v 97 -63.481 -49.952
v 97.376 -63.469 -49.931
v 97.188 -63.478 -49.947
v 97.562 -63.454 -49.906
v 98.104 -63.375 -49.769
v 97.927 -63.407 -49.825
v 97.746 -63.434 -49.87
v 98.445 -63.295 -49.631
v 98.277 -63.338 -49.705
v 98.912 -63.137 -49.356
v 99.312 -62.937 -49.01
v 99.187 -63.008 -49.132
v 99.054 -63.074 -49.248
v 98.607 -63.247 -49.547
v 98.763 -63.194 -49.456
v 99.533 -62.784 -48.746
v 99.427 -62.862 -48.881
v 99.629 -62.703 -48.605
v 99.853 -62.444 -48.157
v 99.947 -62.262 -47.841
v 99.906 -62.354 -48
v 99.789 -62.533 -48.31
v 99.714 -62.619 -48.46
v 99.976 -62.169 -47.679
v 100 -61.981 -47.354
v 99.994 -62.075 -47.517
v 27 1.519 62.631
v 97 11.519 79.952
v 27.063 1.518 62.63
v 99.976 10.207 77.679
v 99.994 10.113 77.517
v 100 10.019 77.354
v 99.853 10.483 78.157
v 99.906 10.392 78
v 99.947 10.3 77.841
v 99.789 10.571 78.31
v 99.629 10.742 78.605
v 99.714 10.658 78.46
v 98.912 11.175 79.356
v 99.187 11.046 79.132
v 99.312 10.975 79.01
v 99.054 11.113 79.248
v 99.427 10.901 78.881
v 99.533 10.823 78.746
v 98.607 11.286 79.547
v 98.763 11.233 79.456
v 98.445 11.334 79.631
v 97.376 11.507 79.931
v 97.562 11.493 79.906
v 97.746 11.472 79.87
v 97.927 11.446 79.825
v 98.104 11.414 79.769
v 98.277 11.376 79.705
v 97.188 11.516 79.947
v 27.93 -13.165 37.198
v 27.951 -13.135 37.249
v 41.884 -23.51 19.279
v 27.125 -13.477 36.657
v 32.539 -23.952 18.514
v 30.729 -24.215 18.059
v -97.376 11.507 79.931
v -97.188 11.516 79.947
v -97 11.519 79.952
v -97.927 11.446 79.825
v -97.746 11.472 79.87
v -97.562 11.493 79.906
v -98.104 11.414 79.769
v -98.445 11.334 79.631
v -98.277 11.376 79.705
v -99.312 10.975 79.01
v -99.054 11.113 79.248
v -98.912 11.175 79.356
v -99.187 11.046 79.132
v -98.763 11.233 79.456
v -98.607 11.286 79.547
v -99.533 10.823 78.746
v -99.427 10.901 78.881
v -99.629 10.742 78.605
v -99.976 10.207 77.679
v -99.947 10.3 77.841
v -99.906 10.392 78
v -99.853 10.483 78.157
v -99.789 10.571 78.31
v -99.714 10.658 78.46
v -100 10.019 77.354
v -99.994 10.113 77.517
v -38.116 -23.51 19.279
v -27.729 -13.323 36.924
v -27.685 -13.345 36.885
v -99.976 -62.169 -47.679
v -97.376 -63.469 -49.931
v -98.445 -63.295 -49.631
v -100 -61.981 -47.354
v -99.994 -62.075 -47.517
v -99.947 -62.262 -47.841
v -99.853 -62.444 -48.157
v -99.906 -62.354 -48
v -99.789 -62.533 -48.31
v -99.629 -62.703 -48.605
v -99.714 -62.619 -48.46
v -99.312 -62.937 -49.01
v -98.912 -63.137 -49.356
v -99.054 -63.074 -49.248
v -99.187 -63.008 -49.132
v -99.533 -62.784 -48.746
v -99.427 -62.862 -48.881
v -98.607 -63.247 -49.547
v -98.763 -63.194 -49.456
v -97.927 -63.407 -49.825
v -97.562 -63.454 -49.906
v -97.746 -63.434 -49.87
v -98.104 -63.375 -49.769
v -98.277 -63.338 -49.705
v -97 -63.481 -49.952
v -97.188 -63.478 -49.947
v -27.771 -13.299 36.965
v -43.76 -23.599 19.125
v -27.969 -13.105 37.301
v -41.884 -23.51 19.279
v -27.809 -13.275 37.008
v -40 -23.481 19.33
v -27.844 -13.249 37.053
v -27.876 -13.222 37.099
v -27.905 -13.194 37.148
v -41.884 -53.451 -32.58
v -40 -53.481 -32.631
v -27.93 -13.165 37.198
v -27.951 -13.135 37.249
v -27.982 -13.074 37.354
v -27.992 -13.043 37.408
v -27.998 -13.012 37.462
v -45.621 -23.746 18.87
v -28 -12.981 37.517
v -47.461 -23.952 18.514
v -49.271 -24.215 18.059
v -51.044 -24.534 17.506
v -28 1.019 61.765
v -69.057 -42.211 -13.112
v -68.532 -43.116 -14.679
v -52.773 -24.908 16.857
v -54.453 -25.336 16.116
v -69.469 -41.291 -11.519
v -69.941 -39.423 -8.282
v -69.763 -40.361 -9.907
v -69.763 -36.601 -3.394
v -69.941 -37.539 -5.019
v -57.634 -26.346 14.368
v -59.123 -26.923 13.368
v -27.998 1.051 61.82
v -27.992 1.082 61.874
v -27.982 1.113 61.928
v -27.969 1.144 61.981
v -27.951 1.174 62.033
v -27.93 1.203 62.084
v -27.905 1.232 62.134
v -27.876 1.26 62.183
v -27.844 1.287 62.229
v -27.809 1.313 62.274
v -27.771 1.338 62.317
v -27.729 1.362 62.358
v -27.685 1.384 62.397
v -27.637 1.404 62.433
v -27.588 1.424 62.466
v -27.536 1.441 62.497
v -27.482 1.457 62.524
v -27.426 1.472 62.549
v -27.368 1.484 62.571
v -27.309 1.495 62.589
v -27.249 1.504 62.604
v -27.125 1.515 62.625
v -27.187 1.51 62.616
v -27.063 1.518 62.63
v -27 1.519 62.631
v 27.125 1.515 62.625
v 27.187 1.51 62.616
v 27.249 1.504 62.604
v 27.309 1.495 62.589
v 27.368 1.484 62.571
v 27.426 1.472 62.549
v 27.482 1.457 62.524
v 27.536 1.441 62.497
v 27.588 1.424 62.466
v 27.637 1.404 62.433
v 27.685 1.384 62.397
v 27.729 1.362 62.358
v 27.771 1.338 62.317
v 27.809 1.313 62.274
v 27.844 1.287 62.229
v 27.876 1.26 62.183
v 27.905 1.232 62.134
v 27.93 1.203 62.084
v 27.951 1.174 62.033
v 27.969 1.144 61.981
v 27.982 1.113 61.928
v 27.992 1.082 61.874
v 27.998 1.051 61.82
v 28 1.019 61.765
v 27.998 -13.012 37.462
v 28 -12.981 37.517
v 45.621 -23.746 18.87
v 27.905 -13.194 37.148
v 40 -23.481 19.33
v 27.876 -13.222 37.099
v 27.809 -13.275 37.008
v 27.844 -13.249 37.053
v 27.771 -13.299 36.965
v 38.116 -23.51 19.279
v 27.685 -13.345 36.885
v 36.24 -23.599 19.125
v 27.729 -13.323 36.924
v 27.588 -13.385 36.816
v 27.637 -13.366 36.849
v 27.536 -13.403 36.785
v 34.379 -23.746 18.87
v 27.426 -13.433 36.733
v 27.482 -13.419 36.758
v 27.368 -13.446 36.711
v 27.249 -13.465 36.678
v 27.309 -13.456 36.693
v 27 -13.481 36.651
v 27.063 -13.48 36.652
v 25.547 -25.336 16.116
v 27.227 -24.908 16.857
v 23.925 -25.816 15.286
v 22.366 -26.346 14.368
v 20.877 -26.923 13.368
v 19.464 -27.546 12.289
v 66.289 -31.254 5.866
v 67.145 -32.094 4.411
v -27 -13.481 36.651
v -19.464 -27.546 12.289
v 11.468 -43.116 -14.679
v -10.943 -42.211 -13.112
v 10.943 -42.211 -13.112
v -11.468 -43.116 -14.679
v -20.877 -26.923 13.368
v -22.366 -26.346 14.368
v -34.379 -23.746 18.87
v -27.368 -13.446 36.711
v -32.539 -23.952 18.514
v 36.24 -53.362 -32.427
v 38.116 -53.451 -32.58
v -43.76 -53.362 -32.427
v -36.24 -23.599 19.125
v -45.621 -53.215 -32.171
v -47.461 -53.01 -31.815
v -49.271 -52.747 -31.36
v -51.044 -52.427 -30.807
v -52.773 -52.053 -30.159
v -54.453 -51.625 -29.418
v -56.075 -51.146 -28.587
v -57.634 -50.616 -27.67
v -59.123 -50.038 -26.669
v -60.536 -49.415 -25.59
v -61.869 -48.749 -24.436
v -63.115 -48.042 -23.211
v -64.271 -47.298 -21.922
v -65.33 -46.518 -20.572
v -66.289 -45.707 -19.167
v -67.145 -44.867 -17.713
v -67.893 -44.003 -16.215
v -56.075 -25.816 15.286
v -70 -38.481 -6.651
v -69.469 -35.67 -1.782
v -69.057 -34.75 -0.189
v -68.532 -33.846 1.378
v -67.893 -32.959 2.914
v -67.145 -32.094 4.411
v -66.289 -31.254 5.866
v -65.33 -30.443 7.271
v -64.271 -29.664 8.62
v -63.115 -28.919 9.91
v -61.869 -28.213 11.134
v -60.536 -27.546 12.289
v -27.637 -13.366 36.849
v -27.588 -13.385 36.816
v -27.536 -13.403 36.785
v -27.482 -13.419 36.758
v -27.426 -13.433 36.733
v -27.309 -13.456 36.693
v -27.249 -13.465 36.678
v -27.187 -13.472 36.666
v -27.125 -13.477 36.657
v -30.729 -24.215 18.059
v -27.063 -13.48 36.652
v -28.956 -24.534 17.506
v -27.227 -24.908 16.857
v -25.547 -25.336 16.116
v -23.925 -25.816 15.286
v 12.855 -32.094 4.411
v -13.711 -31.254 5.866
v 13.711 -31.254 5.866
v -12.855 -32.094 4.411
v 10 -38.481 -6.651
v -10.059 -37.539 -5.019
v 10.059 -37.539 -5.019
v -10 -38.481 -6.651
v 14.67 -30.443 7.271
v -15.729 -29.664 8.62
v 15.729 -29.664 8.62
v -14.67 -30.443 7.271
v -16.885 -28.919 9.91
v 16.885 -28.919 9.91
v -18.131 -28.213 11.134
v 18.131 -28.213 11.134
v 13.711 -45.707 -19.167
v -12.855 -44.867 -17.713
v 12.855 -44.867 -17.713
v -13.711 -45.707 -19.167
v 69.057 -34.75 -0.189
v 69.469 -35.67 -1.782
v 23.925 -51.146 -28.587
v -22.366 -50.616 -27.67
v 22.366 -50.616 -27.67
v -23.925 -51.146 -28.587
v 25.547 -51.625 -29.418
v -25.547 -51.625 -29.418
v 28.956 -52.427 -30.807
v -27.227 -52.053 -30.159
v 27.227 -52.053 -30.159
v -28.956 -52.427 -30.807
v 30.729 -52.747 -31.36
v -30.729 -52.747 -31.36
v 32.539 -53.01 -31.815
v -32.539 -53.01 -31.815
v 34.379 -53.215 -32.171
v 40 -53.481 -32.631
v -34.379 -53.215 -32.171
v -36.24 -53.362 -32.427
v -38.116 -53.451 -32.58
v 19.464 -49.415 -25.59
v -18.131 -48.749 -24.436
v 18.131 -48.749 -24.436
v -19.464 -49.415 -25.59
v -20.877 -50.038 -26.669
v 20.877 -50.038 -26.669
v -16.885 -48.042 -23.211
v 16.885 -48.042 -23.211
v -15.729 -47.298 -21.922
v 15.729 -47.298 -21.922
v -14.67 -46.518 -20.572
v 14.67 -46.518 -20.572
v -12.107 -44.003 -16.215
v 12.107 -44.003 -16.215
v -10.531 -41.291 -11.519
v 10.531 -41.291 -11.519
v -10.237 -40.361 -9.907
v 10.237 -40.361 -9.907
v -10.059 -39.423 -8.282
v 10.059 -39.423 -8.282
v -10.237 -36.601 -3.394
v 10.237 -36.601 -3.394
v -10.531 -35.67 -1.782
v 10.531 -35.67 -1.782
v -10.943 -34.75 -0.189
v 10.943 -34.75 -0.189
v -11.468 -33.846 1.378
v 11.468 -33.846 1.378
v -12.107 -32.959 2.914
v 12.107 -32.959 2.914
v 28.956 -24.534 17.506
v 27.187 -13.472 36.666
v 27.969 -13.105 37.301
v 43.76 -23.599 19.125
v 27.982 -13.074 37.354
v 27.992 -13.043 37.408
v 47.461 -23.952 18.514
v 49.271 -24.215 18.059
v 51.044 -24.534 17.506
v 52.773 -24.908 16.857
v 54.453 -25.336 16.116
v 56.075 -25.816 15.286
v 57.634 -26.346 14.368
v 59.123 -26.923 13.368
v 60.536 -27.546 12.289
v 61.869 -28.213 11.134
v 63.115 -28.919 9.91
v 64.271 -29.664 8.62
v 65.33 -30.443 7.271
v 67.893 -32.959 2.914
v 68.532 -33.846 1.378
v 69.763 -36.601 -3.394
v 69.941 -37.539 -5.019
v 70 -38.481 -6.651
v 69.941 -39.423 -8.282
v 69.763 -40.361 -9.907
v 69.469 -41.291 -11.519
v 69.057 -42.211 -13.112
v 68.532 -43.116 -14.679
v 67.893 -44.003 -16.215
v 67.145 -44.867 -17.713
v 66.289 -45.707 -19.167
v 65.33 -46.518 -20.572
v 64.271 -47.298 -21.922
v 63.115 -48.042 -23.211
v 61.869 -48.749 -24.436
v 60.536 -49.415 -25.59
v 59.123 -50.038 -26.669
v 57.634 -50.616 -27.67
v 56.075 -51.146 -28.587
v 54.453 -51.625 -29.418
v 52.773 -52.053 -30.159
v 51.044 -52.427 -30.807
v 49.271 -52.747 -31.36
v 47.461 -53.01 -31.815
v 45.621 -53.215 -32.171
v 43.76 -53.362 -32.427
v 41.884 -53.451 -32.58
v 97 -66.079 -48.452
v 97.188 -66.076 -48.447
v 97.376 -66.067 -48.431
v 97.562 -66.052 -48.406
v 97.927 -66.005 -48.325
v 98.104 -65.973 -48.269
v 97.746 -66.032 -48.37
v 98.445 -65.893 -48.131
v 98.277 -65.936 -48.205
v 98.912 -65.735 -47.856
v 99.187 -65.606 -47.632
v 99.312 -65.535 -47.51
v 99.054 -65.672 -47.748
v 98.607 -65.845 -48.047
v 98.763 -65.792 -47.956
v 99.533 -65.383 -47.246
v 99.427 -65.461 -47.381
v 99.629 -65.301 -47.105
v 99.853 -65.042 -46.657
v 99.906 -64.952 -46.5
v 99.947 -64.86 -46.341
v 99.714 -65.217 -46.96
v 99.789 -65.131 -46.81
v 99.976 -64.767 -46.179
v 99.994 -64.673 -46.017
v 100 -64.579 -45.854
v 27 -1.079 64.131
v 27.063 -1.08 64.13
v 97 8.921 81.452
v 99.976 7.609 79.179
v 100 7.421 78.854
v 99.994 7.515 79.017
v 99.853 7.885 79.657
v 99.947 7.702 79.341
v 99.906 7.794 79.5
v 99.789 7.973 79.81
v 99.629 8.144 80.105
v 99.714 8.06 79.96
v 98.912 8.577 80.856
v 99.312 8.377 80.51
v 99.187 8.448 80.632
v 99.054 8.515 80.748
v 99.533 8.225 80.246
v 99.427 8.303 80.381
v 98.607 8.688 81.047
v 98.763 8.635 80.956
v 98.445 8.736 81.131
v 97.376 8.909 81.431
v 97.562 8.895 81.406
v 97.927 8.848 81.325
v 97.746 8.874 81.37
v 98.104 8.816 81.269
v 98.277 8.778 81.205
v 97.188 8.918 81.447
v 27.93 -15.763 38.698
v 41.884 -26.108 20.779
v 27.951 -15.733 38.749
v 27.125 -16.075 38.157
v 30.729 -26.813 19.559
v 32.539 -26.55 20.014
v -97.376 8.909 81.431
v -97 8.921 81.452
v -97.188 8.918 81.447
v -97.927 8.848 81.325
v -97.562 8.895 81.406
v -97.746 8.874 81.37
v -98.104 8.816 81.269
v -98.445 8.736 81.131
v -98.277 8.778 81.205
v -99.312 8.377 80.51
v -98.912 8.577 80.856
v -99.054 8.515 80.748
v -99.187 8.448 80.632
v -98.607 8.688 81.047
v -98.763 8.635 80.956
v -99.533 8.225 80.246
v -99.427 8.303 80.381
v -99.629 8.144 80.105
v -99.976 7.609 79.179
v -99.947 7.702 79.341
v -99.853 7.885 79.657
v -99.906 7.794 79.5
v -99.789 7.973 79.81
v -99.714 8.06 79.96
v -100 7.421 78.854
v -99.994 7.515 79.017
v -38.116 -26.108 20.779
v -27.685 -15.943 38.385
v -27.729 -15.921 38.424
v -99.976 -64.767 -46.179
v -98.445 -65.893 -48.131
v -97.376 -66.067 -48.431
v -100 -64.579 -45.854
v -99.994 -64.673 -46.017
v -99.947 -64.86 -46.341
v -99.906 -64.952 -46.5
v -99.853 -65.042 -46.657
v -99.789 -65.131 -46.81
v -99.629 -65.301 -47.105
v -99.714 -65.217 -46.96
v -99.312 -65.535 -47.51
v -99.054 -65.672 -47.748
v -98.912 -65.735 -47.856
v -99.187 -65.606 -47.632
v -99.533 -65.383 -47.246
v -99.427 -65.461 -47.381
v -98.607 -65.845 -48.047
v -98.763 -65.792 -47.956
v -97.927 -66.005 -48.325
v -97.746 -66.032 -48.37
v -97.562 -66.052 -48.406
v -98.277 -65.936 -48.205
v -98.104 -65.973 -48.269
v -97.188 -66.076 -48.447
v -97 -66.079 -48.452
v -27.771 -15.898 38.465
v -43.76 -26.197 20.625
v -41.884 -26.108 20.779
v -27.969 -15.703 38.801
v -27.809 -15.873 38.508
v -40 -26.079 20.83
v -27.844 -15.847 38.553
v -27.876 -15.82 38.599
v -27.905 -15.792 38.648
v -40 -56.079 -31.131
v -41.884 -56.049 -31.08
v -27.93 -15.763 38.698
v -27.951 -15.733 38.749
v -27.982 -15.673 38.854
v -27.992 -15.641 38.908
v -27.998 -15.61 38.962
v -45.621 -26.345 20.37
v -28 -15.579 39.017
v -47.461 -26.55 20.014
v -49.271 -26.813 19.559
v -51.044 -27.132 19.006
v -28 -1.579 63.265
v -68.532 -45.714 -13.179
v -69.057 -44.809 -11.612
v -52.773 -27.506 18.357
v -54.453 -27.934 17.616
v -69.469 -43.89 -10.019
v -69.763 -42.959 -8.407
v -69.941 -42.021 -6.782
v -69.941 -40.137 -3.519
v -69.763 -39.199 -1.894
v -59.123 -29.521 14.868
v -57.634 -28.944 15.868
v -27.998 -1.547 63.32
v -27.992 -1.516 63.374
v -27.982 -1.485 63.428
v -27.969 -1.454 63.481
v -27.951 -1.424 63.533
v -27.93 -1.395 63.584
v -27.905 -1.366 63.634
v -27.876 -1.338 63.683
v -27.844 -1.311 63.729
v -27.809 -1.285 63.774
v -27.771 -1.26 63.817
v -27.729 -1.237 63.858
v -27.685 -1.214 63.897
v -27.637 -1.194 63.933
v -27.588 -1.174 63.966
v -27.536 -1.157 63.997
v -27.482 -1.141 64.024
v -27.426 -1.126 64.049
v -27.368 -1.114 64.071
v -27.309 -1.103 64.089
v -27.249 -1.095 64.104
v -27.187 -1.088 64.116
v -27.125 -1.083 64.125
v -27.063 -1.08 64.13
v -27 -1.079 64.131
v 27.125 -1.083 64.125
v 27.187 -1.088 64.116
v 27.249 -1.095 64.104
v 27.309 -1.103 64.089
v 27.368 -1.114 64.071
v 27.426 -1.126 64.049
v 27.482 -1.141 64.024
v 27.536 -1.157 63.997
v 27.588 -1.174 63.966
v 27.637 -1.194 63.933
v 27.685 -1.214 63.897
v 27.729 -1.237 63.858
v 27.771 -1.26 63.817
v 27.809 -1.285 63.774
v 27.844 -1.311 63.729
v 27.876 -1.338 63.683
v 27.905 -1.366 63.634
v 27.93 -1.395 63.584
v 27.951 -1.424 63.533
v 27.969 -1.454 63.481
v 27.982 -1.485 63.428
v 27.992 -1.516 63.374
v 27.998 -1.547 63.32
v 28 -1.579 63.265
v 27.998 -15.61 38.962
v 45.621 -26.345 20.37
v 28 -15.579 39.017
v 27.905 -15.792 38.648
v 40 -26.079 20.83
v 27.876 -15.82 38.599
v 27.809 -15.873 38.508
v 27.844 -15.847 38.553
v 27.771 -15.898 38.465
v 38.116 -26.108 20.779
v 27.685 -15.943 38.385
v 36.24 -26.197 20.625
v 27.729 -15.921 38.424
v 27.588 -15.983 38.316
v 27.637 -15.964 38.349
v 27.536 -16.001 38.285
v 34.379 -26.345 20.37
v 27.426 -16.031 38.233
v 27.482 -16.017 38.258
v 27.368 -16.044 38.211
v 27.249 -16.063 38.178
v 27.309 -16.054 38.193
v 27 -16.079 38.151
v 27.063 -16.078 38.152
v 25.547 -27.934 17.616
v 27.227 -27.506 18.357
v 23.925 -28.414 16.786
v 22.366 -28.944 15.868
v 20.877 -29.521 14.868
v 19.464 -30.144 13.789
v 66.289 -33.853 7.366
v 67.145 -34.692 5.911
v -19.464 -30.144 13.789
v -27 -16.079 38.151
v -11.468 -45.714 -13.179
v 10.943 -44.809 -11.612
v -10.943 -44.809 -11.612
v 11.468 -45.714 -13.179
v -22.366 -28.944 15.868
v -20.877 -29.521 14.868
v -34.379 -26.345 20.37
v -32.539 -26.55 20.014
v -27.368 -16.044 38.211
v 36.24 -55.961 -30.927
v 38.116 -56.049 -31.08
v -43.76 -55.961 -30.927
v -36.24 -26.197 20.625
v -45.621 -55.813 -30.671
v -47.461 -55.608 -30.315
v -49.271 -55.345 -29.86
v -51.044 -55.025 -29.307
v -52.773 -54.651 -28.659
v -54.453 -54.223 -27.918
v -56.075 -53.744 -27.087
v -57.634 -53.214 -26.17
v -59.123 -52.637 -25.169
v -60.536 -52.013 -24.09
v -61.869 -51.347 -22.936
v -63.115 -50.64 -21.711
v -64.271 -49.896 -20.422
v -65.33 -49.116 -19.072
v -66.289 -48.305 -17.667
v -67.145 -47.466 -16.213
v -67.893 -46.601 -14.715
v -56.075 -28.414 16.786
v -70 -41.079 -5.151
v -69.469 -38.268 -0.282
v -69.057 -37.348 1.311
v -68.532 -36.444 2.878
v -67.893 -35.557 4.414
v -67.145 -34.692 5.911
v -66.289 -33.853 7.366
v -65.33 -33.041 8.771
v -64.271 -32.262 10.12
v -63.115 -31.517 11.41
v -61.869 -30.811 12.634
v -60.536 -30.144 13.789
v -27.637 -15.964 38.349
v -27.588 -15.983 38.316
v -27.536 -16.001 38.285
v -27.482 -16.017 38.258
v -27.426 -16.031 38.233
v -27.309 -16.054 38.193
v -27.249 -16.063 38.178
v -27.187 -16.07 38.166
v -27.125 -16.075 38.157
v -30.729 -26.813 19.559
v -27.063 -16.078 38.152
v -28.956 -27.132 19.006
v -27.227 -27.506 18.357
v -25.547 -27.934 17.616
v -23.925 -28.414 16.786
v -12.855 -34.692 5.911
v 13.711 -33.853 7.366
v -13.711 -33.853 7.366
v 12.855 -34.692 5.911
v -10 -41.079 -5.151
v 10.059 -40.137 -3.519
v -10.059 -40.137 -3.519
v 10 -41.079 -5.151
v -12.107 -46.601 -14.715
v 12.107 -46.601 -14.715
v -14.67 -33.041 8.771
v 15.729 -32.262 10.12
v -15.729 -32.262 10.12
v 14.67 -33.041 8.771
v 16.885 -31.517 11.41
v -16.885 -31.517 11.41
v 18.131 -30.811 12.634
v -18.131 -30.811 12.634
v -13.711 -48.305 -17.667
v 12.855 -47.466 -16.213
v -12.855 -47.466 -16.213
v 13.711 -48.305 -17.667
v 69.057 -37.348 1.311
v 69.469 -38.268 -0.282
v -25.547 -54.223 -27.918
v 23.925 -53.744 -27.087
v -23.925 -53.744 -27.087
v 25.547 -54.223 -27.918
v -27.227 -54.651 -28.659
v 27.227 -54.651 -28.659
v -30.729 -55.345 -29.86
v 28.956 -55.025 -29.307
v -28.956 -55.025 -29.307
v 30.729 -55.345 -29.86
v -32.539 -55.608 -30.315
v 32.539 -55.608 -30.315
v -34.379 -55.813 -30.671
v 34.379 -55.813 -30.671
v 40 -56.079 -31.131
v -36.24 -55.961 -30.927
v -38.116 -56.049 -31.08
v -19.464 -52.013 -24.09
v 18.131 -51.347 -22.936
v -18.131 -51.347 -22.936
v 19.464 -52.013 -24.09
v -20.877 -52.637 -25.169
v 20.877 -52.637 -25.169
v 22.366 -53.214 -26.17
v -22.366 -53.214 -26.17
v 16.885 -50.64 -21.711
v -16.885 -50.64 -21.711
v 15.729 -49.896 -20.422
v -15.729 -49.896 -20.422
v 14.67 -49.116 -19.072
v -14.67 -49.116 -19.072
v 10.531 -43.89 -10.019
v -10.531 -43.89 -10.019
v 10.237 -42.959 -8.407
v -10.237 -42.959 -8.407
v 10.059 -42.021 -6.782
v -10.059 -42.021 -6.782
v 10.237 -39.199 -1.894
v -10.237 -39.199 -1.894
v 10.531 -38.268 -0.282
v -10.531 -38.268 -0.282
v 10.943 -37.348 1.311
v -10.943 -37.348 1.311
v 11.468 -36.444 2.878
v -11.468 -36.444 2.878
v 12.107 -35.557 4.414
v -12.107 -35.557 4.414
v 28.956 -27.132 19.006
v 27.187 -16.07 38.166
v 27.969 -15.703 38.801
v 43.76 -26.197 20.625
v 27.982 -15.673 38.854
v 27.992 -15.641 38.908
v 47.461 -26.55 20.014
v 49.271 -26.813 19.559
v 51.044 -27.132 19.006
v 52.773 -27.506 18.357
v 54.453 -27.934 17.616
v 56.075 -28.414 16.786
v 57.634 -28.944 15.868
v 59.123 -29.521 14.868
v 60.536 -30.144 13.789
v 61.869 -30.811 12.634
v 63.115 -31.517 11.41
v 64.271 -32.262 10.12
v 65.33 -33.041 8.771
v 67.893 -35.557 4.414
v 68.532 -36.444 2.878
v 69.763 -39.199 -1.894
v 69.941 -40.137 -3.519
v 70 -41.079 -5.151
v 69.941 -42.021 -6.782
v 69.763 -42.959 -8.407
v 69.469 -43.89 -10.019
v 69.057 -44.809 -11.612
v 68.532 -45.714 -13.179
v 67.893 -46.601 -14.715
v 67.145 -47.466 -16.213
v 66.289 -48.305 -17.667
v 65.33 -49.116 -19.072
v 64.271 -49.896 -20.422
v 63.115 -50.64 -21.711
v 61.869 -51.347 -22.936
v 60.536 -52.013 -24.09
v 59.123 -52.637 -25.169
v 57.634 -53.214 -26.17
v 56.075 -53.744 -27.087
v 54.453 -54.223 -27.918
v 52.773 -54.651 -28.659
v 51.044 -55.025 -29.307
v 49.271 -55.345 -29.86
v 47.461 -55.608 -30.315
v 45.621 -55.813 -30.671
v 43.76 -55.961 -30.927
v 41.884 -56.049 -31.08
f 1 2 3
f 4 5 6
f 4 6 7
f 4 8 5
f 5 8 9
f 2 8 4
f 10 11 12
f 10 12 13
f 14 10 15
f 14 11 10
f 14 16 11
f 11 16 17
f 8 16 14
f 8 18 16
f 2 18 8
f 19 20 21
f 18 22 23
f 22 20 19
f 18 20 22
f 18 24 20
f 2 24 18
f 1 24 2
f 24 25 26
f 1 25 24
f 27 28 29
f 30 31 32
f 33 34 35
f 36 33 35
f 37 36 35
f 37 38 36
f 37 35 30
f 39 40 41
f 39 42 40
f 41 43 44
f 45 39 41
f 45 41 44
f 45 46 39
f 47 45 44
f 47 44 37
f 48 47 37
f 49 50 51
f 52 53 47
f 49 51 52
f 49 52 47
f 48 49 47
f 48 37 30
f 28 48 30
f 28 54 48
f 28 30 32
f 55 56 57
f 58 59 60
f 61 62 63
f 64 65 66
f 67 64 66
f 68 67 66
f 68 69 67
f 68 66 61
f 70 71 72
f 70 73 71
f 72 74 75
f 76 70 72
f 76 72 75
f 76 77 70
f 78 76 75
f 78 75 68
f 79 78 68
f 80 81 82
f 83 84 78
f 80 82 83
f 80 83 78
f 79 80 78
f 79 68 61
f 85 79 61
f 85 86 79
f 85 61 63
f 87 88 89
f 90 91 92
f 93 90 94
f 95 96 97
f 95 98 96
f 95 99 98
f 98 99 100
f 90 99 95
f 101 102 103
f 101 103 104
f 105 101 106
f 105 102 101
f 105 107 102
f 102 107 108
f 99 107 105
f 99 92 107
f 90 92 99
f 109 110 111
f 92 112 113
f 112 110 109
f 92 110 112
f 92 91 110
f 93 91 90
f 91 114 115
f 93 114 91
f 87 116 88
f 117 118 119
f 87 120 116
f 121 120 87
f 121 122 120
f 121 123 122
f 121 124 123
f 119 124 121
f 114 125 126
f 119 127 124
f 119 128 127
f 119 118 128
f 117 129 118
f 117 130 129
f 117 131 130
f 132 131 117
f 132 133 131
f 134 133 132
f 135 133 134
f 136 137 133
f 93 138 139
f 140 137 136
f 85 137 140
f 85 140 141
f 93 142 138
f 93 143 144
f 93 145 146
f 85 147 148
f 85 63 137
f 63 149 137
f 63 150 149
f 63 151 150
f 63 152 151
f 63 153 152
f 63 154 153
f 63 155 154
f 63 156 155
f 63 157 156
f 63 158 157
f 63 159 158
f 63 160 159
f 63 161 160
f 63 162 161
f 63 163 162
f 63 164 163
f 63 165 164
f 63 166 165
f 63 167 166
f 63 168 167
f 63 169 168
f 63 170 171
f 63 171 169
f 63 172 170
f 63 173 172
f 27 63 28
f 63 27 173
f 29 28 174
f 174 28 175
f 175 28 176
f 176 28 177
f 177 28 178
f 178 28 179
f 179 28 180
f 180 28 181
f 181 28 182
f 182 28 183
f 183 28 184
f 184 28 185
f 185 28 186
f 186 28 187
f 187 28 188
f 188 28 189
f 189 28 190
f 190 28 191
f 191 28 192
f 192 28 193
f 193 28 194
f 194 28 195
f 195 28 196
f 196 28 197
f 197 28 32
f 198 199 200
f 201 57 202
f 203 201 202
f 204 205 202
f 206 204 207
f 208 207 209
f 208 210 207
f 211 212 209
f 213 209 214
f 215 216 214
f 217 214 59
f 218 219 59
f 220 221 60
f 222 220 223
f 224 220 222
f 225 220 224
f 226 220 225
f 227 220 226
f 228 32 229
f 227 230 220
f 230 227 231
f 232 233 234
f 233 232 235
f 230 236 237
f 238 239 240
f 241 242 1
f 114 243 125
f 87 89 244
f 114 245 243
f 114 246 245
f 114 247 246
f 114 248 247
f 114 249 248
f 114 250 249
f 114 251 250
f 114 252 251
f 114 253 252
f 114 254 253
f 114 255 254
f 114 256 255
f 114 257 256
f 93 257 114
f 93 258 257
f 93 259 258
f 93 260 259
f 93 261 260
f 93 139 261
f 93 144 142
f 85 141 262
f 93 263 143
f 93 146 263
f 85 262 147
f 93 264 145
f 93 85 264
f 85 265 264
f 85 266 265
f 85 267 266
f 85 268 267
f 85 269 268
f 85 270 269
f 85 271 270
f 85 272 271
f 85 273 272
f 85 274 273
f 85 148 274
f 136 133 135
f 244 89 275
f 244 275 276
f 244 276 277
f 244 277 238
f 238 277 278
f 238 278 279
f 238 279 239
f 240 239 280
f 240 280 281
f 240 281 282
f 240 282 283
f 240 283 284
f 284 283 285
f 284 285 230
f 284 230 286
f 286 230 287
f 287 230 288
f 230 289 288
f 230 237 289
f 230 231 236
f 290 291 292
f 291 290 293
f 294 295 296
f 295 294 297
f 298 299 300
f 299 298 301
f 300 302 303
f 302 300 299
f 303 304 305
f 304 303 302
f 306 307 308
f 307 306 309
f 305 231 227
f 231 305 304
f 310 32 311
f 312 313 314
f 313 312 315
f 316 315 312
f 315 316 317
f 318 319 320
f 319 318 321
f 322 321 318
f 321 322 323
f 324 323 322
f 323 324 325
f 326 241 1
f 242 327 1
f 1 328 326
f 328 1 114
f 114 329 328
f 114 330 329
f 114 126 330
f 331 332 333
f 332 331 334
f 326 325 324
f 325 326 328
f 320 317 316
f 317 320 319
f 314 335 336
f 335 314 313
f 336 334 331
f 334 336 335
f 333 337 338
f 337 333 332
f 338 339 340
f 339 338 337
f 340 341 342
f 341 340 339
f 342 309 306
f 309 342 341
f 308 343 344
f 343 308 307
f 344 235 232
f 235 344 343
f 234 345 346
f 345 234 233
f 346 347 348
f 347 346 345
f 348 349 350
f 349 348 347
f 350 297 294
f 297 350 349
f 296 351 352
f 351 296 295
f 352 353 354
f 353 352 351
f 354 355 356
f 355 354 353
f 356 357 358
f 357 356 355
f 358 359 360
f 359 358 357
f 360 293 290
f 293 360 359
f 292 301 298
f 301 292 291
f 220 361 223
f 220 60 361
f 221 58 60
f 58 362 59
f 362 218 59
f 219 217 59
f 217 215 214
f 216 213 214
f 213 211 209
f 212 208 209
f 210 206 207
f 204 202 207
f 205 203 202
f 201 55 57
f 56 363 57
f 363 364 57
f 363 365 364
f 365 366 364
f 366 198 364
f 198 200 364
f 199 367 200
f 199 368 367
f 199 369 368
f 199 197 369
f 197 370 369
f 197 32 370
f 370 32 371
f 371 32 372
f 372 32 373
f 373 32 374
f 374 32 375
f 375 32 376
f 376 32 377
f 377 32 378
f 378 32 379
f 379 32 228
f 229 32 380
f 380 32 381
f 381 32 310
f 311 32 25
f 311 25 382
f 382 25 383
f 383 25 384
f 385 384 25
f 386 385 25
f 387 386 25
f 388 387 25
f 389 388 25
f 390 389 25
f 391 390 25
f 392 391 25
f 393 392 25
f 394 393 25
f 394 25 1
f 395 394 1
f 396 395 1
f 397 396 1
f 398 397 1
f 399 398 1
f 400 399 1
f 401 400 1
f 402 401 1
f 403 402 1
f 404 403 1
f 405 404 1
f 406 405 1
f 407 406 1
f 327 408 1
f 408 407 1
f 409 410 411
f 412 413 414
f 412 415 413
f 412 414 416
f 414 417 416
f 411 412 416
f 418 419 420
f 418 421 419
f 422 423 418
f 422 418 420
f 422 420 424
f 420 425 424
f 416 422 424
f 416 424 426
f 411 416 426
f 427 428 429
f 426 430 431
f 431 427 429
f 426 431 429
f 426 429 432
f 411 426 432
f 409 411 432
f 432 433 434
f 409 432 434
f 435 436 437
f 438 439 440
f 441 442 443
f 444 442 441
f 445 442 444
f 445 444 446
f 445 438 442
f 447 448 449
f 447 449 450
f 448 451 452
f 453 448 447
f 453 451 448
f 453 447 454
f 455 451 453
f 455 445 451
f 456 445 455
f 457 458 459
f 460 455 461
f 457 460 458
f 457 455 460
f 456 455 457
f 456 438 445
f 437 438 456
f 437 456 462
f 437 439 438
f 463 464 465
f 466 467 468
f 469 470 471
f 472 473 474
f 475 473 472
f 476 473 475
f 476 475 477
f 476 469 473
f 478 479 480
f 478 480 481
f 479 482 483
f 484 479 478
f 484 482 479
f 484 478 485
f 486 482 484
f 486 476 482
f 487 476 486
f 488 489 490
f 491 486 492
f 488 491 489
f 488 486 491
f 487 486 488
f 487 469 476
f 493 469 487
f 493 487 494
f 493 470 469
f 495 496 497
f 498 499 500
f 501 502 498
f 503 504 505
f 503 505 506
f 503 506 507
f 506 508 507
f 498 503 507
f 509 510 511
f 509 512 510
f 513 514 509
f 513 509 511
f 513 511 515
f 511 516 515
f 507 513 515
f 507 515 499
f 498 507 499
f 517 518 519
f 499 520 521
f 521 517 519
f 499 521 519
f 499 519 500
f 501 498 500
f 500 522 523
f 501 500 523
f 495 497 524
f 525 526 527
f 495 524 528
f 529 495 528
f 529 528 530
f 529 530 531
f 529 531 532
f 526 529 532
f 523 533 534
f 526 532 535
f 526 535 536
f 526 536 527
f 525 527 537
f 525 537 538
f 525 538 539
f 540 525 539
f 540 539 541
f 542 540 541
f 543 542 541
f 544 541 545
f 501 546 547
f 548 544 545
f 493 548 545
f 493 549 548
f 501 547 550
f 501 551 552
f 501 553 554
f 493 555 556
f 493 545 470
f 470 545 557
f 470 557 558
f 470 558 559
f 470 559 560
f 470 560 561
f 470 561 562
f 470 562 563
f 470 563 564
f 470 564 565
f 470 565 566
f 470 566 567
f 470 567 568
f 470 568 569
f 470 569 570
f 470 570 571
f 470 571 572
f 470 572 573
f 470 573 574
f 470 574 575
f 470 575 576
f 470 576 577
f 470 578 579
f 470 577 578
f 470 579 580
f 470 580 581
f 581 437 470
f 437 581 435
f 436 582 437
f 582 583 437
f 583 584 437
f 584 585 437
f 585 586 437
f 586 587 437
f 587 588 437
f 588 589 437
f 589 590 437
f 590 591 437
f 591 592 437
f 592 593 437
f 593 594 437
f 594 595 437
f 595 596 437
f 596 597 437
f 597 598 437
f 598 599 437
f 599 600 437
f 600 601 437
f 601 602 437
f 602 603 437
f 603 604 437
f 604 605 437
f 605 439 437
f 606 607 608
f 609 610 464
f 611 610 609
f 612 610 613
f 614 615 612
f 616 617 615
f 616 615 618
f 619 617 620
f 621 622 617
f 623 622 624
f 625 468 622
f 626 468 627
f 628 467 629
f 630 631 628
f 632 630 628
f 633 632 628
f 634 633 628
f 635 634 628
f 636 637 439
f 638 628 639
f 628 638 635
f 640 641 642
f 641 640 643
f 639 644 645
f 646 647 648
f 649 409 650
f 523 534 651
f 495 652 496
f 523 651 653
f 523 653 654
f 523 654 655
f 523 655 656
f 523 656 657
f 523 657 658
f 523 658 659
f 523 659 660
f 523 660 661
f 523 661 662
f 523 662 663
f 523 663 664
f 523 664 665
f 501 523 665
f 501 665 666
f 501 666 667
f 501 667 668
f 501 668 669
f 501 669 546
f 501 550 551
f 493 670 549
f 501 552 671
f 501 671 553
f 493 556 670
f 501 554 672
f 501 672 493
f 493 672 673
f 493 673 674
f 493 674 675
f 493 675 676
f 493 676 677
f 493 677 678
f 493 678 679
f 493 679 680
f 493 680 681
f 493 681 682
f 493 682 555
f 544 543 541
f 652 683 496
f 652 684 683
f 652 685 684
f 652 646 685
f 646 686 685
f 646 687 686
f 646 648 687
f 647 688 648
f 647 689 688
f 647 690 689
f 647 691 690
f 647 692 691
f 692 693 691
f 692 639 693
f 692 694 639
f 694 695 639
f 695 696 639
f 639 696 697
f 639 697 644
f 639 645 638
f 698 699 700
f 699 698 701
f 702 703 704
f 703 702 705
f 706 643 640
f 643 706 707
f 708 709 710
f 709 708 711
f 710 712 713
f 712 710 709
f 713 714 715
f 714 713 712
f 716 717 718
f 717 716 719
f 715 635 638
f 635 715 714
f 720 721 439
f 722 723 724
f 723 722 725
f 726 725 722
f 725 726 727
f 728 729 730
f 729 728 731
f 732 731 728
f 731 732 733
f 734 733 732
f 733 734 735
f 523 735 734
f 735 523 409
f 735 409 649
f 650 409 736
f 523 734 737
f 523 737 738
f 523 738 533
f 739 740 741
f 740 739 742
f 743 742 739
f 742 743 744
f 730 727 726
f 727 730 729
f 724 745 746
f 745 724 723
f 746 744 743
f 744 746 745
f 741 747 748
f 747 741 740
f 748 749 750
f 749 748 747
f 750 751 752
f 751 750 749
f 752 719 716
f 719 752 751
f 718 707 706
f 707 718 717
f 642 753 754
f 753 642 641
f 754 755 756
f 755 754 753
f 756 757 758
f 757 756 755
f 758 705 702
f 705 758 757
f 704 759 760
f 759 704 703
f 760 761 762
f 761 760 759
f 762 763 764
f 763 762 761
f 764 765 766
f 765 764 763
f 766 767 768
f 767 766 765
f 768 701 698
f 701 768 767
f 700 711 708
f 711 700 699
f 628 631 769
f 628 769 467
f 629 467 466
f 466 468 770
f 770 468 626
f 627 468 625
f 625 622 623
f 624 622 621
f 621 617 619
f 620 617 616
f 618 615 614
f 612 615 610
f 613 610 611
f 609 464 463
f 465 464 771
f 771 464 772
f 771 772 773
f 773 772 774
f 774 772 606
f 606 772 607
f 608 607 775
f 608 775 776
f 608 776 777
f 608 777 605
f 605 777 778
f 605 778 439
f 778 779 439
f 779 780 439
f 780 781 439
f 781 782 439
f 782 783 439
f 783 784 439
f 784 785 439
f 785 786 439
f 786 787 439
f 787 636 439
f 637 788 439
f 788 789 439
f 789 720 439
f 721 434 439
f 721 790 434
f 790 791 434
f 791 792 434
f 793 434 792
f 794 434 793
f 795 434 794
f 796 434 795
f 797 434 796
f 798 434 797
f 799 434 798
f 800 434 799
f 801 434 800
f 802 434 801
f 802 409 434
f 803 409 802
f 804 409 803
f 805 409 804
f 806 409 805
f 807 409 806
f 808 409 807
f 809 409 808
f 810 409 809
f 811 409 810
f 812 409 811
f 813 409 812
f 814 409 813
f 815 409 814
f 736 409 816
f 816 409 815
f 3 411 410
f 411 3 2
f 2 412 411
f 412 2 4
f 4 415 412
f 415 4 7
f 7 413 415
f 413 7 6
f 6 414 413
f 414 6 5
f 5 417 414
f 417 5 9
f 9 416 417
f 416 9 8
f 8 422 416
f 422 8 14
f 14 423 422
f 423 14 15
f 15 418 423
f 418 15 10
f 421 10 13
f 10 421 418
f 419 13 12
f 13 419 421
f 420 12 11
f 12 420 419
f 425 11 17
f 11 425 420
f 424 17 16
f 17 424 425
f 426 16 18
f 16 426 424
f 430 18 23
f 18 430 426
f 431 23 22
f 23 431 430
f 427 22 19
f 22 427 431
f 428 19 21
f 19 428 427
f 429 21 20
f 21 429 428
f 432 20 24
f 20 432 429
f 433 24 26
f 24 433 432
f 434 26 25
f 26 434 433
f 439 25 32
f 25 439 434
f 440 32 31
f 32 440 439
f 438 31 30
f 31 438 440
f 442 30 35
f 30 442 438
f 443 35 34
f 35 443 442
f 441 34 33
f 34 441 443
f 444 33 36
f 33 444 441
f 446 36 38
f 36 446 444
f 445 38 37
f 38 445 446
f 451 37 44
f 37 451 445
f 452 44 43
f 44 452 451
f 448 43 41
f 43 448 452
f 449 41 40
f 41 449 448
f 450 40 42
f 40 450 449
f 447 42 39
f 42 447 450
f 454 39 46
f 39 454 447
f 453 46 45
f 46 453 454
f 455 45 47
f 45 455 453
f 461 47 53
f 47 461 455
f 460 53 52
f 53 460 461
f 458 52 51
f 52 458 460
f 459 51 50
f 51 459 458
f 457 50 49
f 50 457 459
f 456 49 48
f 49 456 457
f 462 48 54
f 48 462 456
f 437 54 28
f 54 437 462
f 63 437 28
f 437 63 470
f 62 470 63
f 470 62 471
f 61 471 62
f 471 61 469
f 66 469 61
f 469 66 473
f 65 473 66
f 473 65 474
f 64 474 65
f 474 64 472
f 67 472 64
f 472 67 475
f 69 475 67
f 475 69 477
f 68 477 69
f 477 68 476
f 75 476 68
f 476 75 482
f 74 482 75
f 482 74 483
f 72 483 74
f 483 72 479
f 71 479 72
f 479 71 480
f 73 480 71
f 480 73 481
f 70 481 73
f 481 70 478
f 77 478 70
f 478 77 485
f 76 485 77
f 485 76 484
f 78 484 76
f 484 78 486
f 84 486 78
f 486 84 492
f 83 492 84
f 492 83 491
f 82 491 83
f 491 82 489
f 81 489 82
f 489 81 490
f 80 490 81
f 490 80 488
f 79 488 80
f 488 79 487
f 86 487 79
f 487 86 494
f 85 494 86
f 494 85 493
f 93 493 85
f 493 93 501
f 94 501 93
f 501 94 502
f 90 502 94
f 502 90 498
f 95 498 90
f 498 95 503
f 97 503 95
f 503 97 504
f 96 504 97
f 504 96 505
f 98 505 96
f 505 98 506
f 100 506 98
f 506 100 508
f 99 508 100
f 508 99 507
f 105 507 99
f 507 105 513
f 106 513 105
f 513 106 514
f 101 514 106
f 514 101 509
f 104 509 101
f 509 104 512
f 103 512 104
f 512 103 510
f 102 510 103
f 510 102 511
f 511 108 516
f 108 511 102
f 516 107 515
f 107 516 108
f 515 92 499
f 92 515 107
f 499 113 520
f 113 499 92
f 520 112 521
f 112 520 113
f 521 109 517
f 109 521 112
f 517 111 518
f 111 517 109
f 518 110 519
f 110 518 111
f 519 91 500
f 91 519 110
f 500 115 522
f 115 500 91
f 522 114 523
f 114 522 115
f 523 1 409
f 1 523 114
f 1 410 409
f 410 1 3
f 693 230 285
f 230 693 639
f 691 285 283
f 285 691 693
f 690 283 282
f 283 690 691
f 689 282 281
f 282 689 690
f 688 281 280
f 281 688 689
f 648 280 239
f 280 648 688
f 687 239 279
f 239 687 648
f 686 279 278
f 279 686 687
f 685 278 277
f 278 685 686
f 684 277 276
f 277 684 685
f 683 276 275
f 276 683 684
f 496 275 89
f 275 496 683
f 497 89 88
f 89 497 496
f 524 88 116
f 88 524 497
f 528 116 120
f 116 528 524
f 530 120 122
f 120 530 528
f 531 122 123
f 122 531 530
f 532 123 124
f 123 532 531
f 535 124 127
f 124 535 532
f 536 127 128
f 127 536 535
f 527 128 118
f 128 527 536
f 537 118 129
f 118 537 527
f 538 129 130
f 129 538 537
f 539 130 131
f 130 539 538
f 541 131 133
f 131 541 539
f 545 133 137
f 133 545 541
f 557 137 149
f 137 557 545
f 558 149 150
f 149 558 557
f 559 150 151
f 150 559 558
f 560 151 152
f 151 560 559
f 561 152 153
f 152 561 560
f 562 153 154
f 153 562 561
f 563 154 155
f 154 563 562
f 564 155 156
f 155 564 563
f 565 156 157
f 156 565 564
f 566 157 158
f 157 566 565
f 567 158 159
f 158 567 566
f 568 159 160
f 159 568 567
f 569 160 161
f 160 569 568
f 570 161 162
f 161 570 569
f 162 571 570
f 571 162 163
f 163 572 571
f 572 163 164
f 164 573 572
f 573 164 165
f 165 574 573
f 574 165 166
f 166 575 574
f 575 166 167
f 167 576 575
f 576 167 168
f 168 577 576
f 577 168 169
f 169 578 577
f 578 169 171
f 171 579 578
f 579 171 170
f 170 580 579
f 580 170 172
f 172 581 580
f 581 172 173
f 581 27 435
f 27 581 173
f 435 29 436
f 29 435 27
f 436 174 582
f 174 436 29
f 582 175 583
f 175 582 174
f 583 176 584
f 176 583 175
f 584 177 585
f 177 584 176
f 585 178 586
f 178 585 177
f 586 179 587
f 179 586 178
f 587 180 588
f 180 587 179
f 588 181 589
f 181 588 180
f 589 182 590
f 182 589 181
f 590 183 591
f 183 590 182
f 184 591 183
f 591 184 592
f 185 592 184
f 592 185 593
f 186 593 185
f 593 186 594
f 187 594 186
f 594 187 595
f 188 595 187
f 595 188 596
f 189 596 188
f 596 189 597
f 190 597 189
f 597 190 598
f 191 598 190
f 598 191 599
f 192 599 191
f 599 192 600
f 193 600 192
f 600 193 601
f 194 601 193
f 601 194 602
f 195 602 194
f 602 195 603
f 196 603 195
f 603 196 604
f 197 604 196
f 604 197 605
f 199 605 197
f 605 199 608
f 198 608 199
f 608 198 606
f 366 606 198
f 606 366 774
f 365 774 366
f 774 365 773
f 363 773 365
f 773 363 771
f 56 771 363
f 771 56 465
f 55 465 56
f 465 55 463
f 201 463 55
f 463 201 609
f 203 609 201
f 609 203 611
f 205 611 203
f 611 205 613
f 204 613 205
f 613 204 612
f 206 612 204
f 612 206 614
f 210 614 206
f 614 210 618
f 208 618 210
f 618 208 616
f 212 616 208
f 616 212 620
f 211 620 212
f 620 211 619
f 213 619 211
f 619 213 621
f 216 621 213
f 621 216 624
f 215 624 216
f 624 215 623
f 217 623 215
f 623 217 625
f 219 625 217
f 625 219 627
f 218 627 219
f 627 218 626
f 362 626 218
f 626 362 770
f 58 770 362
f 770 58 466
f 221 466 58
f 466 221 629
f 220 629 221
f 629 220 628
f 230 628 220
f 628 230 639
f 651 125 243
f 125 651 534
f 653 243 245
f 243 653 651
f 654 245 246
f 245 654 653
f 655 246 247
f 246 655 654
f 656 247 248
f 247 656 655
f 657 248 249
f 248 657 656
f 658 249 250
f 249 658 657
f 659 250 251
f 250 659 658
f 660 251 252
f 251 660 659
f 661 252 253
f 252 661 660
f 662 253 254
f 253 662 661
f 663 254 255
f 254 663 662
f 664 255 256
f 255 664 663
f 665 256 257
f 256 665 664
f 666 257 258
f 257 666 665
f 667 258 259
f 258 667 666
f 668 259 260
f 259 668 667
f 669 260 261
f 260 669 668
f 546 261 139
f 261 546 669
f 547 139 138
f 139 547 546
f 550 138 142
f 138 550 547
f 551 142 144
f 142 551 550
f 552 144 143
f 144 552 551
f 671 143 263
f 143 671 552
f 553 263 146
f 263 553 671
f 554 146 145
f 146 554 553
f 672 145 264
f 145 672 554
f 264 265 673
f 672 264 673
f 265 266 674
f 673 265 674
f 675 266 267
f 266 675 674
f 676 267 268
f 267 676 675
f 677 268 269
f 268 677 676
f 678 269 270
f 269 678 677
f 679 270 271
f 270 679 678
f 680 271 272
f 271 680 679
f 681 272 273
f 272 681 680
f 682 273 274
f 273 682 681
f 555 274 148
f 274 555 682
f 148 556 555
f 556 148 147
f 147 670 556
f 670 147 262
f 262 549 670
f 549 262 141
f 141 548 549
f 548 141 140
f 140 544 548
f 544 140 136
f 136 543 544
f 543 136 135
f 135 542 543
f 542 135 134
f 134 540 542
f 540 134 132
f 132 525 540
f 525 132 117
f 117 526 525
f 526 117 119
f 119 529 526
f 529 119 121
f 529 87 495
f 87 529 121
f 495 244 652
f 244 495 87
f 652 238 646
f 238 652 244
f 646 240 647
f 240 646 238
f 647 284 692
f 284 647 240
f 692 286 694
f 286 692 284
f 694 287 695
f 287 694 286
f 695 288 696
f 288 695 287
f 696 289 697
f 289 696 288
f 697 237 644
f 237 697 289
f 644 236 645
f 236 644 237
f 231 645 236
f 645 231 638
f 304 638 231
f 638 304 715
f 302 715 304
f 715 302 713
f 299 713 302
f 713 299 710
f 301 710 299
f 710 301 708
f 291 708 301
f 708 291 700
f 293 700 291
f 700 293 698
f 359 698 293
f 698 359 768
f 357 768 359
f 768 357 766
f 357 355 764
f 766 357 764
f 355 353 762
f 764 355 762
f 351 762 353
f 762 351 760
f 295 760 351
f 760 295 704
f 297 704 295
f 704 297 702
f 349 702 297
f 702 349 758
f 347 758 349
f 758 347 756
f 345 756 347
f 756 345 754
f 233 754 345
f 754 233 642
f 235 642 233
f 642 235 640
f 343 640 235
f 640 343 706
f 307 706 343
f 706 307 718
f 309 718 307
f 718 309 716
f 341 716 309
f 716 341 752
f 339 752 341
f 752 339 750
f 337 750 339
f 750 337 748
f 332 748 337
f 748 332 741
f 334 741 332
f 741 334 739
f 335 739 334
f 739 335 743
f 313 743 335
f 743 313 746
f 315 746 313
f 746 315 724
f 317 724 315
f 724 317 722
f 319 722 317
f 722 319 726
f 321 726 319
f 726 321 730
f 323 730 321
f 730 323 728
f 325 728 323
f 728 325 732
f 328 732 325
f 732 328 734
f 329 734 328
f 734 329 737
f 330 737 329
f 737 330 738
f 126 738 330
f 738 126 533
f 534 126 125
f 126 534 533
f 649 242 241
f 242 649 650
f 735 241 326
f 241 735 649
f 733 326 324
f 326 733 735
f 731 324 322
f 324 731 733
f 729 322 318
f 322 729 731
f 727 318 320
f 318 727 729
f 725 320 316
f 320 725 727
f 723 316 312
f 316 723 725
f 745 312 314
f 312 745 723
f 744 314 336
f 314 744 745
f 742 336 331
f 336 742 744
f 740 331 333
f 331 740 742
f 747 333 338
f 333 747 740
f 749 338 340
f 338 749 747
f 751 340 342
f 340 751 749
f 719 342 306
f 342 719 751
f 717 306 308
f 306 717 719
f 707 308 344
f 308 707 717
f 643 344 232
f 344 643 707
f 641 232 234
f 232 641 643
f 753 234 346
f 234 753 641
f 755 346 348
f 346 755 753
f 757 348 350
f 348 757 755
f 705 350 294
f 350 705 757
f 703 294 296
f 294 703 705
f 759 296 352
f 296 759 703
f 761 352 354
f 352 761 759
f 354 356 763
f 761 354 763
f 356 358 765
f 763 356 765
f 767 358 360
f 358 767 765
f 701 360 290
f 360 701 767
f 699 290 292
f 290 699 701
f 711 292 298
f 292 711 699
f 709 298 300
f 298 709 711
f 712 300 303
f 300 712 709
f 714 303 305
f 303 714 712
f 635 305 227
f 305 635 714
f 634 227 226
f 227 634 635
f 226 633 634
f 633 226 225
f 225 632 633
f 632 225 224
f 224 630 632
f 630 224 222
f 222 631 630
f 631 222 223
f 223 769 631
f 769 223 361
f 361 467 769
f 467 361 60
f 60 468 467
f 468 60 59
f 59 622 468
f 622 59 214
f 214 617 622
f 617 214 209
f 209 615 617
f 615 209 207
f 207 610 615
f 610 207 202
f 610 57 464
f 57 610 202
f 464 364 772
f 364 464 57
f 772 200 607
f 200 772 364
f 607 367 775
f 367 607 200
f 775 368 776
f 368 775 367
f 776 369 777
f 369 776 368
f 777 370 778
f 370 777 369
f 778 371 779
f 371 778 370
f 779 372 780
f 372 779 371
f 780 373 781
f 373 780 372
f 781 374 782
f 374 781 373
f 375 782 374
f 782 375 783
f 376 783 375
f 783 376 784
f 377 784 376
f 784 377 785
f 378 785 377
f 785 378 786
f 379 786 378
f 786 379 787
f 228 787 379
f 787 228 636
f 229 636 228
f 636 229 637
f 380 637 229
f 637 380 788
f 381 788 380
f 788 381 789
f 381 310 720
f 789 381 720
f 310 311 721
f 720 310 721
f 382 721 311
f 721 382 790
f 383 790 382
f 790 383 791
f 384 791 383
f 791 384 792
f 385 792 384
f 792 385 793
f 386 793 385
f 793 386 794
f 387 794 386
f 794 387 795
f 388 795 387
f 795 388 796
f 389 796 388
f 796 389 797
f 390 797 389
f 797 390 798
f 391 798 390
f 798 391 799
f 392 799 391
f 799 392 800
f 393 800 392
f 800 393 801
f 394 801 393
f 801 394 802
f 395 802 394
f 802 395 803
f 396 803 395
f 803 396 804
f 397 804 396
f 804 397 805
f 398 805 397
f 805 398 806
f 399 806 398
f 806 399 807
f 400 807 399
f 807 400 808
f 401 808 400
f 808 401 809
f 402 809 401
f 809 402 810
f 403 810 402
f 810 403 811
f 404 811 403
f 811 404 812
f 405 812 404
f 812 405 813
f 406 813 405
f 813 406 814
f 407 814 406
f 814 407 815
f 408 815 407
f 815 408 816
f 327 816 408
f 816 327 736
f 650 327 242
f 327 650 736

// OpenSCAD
// Customizable Flow Meter Box
// Copyright: Olle Johansson 2018
// License: CC BY-SA

//CUSTOMIZER VARIABLES

// Width of the box in mm
width_of_box = 200; // [40:300]

// Length of the box in mm
length_of_box = 150; // [40:200]

// Height of the box in mm
height_of_box = 30; // [20:200]

// Thickness in mm of walls
thickness = 3; // [3:6]

// Radius in mm of rounded corners
corner_radius = 3; // [1:5]

// Angle in degrees of box top
angle_of_box_top = 60; // [0:85]

// Y offset in mm from center of displayotron
y_offset_displayotron = 40; // [0:100]

// Diameter in mm of vote buttons
diameter_of_vote_buttons = 60; // [20:100]

// X offset (negative) in mm of vote buttons from center
x_offset_vote_buttons = 40; // [0:20]

// Y offset in mm of vote buttons from center
y_offset_vote_buttons = 25; // [0:20]

left_distance_of_usb = 20;

bottom_distance_of_usb = 5;

//CUSTOMIZER VARIABLES END

/* [Hidden] */

$fn=100;

/* ** Utility modules ** */

module rectangle_rounded(width, height, radius=1) {
	minkowski() {
		circle(r = radius);
		square([width - 2 * radius, height - 2 * radius], center = true);
	}
}

/* ** Partials ** */

module main_box() {
    // Top
    rotate([angle_of_box_top, 0, 0])
    translate([0, 0, height_of_box]) {
        box_top();
    }

    // Walls
/*
    linear_extrude(height_of_box) {
        difference() {
            rectangle_rounded(width_of_box, length_of_box, corner_radius);
            rectangle_rounded(width_of_box - thickness, length_of_box - thickness, corner_radius);
        }
    }
*/
}

module box_top() {
    linear_extrude(height = thickness)
    difference() {
        rectangle_rounded(width_of_box, length_of_box, corner_radius);

        displayotron();
        vote_buttons();
    }
}

module bottom_lid() {
    // Base
    linear_extrude(height = thickness)
    rectangle_rounded(width_of_box, length_of_box, corner_radius);
    // TODO: Add ridge
    // TODO: Add latches
}

module vote_buttons() {
    translate([- x_offset_vote_buttons, - y_offset_vote_buttons, 0])
    circle(d = diameter_of_vote_buttons);
    translate([x_offset_vote_buttons, - y_offset_vote_buttons, 0])
    circle(d = diameter_of_vote_buttons);
}

module control_buttons() {
}

module displayotron() {
    displayotron_width = 56;
    displayotron_height = 30;
    translate([0, y_offset_displayotron, 0])
    rectangle_rounded(displayotron_width, displayotron_height);
}

module USB() {
    usb_w = 12;
    usb_h = 8;
    translate([left_distance_of_usb, bottom_distance_of_usb + thickness + usb_h/2, 0])
        rectangle_rounded(usb_w, usb_h);
}

/* ** Main object ** */

module flow_meter_box() {
    difference() {
        main_box();
        
        control_buttons();
        USB();
    }
}

flow_meter_box();
